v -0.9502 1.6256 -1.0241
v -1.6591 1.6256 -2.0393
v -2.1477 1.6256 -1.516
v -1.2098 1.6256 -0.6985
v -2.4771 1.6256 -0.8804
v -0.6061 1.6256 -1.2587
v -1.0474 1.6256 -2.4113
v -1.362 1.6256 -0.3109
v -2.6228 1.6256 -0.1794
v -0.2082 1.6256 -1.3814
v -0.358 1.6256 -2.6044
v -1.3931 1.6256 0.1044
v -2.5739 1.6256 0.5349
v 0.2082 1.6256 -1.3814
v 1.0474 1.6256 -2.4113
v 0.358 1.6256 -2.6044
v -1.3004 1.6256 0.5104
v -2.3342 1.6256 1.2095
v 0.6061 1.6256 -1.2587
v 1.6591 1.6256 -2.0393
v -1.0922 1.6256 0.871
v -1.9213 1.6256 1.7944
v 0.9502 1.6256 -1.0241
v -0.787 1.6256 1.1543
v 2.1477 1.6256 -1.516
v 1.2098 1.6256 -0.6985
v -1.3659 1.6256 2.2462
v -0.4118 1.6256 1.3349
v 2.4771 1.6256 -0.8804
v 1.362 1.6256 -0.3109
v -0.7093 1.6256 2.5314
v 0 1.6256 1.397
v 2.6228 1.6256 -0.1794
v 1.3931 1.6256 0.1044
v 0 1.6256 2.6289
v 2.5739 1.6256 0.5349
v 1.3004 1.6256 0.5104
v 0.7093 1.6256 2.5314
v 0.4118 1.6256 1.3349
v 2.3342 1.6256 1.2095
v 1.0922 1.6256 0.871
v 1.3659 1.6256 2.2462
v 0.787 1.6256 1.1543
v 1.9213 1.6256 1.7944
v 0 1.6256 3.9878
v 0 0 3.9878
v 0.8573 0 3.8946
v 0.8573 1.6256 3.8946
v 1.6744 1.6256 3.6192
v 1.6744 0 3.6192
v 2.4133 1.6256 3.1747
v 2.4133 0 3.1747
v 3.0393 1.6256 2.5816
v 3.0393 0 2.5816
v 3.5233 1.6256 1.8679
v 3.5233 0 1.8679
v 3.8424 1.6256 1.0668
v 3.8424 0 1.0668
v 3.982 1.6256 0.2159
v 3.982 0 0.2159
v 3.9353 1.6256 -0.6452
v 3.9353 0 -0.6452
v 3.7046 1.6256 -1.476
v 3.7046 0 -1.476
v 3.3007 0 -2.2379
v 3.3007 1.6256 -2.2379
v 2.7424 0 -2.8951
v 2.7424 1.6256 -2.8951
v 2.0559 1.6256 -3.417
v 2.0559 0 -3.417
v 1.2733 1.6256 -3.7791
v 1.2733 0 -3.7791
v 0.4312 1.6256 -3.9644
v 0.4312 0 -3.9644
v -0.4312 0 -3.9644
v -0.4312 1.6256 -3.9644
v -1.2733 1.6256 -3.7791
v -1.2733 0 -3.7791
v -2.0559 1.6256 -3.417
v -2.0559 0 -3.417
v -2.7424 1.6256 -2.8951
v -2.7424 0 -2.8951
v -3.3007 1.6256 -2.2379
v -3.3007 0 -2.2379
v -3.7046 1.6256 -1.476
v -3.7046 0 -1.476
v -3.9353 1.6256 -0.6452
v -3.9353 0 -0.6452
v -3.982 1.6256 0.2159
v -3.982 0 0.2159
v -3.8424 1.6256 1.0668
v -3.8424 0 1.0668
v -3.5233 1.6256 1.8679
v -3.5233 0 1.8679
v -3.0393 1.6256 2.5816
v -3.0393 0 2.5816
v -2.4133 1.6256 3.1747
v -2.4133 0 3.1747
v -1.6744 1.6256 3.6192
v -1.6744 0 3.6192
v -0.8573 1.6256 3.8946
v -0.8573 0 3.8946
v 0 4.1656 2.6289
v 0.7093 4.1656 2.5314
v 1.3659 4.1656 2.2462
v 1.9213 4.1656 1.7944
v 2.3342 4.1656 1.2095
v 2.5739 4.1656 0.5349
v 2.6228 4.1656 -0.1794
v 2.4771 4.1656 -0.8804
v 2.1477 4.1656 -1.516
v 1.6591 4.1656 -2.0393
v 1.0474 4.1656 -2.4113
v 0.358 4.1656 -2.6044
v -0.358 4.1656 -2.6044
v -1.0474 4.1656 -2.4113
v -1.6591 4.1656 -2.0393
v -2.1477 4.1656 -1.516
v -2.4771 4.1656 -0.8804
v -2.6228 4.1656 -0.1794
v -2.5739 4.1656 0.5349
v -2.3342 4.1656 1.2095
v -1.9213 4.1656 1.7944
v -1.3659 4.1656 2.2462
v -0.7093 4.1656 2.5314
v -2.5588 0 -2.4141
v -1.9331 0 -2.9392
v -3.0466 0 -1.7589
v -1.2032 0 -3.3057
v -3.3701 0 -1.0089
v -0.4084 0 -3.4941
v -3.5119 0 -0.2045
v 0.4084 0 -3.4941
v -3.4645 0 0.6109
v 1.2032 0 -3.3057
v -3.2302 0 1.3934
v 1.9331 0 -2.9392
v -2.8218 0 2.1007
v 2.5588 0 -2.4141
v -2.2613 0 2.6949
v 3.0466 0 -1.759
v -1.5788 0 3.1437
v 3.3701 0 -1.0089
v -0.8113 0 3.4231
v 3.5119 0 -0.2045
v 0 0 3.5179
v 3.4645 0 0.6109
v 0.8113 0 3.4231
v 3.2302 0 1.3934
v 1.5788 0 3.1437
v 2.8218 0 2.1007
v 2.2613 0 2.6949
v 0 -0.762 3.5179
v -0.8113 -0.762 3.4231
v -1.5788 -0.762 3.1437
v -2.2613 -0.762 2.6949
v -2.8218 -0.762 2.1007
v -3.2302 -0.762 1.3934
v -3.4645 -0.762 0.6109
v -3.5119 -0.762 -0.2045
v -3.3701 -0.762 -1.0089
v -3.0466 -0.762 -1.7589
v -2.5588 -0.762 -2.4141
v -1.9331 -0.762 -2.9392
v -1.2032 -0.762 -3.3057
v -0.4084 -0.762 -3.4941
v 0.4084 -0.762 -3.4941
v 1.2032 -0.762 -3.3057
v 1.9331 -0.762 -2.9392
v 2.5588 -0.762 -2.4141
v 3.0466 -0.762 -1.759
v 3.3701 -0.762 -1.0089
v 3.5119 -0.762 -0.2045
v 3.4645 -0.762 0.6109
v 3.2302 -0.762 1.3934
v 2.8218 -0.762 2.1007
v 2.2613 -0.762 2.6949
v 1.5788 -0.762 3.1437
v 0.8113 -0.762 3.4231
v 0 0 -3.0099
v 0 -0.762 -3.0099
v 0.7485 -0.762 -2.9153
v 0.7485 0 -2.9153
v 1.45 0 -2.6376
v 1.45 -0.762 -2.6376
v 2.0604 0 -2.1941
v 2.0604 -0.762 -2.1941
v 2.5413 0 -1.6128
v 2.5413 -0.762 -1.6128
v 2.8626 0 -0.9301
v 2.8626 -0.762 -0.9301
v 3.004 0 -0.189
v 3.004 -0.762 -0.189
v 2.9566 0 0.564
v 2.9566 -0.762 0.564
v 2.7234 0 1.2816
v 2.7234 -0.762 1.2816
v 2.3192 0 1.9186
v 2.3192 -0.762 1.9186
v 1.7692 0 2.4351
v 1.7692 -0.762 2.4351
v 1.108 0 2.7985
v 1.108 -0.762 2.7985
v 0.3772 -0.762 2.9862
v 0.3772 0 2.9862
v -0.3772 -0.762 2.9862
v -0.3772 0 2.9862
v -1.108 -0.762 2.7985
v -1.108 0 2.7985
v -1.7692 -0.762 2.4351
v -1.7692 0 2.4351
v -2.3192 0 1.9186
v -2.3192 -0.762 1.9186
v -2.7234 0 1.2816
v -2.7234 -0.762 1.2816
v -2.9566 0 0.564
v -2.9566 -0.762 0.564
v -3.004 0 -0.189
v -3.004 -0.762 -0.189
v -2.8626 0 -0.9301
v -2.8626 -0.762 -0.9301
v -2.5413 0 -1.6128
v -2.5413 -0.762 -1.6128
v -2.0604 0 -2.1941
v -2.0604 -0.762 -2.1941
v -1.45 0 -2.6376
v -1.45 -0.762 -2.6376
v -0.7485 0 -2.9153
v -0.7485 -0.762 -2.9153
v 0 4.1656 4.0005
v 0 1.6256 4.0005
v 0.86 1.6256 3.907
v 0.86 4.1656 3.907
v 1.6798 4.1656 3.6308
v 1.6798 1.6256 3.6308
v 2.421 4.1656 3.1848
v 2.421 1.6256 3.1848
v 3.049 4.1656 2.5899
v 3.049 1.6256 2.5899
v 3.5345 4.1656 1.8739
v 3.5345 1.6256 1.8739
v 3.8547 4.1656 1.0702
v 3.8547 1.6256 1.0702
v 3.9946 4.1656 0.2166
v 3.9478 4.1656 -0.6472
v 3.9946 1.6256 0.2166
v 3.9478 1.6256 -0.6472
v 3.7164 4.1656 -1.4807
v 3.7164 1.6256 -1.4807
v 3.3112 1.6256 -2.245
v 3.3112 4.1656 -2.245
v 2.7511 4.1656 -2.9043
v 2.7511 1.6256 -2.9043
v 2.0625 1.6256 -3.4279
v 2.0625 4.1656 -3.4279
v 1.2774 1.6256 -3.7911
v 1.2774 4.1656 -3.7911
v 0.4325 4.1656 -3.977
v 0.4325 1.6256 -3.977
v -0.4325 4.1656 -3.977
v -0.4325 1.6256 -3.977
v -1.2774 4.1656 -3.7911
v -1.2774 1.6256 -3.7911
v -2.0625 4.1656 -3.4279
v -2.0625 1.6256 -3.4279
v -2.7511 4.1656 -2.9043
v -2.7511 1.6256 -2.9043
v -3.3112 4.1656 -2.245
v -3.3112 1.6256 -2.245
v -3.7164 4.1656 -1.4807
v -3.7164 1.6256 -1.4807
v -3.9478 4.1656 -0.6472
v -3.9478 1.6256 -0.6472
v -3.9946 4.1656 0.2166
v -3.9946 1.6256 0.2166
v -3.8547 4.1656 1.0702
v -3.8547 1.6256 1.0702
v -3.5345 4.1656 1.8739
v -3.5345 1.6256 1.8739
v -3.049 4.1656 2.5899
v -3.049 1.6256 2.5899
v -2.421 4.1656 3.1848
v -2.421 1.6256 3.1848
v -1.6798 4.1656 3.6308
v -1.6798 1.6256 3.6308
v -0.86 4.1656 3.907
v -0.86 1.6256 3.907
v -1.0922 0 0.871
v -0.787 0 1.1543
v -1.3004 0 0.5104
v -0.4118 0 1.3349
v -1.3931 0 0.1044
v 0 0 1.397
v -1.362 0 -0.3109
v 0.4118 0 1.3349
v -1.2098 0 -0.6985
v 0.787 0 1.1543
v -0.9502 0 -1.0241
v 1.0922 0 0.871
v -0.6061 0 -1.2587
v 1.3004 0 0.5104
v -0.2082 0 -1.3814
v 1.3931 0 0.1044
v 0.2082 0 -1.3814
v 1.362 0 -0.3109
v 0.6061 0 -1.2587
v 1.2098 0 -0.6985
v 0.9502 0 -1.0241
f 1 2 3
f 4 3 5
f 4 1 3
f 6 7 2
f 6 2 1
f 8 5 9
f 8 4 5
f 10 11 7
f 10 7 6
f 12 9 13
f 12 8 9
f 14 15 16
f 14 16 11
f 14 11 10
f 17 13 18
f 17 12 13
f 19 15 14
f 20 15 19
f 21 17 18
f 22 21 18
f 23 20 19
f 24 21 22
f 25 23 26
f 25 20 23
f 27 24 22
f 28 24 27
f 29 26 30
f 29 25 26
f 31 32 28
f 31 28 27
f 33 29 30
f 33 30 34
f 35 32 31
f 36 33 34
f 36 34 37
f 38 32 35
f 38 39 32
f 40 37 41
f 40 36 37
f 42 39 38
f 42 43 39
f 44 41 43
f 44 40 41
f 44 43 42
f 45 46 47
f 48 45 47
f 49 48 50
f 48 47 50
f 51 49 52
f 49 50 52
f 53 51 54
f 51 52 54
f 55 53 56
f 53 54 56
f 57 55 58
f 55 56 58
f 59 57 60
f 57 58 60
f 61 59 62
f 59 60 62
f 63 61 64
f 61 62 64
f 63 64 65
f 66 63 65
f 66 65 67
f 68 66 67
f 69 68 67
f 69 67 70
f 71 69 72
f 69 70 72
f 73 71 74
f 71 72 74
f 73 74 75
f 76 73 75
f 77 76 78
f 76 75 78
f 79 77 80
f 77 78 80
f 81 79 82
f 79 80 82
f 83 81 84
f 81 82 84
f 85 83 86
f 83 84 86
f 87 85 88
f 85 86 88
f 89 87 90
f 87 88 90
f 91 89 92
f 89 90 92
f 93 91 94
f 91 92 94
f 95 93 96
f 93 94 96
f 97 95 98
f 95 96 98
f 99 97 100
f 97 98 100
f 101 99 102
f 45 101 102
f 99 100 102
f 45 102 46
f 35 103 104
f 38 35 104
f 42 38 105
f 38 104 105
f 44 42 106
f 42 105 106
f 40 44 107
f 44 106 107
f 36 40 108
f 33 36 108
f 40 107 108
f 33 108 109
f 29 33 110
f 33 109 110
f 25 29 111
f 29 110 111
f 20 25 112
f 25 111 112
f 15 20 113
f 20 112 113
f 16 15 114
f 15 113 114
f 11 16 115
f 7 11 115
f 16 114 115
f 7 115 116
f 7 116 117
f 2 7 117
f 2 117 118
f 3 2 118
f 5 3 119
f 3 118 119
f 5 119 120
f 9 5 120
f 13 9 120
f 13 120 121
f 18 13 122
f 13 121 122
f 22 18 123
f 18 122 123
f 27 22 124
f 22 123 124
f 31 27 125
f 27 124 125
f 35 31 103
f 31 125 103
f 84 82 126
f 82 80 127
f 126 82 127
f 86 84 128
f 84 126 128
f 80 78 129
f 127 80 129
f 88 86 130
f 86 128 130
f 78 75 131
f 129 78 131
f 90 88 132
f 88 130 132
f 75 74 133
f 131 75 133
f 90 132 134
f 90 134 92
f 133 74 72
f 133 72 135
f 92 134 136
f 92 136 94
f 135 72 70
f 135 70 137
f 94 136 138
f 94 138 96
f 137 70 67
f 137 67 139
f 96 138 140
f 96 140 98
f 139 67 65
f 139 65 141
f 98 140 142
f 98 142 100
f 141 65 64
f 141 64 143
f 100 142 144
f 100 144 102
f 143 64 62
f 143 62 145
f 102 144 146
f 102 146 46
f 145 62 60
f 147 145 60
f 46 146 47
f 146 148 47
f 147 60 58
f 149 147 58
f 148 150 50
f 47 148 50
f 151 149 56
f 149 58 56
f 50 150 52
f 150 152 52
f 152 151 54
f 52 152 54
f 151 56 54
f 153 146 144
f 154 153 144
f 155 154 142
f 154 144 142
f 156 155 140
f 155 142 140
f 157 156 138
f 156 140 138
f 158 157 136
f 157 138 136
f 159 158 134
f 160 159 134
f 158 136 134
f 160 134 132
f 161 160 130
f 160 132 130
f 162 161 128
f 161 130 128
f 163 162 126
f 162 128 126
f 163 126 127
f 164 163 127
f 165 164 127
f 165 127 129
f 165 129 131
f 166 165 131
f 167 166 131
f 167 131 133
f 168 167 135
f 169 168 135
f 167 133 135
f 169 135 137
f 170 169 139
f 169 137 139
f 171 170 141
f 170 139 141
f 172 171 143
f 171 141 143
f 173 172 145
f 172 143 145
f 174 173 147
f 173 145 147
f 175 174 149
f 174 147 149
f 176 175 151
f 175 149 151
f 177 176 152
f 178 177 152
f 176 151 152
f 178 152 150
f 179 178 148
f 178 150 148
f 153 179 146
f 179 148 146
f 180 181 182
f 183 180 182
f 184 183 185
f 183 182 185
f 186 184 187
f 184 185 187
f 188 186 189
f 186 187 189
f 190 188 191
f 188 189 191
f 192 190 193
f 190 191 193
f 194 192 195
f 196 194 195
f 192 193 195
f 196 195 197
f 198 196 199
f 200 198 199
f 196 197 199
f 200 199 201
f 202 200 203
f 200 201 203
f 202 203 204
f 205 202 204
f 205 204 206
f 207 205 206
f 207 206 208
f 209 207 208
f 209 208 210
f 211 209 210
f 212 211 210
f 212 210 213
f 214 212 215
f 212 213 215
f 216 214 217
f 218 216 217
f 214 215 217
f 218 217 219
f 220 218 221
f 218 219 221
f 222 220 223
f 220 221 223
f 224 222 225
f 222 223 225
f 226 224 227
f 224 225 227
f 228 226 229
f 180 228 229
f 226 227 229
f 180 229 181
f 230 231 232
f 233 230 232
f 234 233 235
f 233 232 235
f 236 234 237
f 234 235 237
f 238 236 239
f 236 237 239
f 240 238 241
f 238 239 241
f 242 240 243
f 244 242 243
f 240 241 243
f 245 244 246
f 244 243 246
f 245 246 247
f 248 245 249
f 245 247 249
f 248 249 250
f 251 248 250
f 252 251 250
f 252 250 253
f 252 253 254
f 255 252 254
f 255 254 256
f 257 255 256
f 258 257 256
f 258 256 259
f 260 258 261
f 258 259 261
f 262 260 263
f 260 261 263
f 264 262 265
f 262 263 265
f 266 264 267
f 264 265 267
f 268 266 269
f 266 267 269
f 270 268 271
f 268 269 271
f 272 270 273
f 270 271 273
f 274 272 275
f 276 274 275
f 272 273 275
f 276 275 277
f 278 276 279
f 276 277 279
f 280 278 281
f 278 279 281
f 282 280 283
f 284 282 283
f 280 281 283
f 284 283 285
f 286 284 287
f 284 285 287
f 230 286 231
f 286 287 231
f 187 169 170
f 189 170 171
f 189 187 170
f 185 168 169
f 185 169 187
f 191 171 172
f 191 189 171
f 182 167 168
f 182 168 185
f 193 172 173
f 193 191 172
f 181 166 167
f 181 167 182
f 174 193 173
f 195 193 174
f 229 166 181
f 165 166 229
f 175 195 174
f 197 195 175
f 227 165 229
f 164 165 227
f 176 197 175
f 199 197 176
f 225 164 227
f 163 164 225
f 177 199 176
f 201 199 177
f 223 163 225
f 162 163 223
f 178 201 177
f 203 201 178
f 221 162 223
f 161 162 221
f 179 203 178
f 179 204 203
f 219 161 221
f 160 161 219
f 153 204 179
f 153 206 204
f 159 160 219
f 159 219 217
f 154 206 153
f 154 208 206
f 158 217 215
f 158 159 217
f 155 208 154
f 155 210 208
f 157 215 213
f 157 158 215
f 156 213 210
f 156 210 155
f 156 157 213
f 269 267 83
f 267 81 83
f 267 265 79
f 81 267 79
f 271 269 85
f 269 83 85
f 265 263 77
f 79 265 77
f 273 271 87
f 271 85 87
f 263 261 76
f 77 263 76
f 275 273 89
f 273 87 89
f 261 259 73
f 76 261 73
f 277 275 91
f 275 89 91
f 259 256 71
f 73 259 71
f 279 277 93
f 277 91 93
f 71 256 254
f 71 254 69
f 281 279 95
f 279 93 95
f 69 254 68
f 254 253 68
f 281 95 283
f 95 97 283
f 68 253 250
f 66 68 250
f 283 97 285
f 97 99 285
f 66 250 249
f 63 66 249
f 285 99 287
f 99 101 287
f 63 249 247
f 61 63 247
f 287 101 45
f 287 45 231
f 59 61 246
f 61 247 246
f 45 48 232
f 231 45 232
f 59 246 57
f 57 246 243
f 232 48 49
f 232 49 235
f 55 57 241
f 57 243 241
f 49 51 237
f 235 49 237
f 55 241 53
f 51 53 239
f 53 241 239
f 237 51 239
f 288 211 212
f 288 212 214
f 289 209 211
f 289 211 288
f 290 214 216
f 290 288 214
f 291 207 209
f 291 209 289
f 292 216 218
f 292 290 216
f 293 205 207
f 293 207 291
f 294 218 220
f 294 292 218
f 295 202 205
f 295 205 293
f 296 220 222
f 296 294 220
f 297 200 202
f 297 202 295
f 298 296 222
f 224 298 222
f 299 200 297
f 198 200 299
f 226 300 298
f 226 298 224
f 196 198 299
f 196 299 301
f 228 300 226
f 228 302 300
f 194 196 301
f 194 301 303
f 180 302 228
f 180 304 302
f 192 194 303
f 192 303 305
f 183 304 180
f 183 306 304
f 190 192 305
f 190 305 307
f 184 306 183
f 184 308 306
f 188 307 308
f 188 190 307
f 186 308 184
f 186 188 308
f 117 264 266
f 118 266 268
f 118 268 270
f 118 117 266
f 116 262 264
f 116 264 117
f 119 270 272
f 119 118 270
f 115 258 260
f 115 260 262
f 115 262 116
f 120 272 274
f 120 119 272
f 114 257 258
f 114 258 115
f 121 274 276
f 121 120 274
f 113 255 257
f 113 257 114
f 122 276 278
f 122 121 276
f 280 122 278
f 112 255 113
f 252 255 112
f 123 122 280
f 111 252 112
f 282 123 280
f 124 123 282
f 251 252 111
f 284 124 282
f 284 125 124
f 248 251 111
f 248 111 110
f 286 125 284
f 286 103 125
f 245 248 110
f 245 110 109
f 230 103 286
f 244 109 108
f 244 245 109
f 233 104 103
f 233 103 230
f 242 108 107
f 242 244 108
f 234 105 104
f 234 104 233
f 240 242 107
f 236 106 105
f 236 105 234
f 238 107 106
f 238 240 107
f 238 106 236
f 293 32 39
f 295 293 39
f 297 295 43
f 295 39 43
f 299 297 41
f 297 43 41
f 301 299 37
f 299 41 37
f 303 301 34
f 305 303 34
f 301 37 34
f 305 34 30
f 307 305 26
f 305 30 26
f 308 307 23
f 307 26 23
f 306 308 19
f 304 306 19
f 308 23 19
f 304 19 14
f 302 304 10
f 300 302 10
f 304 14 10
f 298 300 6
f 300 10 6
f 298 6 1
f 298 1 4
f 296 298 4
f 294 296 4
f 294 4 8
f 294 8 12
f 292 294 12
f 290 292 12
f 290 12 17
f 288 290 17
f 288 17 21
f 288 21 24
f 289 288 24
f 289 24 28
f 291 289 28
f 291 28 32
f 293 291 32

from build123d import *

# Parameters (mm, degrees)
SKETCH1_R           = 3.9878
BOSS_EXTRUDE1_DEPTH = 1.6256
SKETCH2_R           = 4.0005
BOSS_EXTRUDE2_DEPTH = 2.54
SKETCH3_R           = 3.5179
BOSS_EXTRUDE3_DEPTH = 0.762
SKETCH4_R           = 3.0099
CUT_EXTRUDE1_DEPTH  = 0.762
SKETCH5_R           = 2.6289
CUT_EXTRUDE2_DEPTH  = 2.54
SKETCH6_R           = 1.397
CUT_EXTRUDE3_DEPTH  = 7.201580484


with BuildPart() as part:
    # Sketch1 → Boss-Extrude1 (new body)
    with BuildSketch(Plane(origin=(0, 0, 0), x_dir=(1, 0, 0), z_dir=(0, 1, 0))):
        with Locations(Location((0, 0, 0), (0, 0, 270))):
            Circle(SKETCH1_R)
    extrude(amount=BOSS_EXTRUDE1_DEPTH)

    # Sketch2 → Boss-Extrude2 (add)
    with BuildSketch(Plane(origin=(0, 1.6256, 0), x_dir=(1, 0, 0), z_dir=(0, 1, 0))):
        with Locations(Location((0, 0, 0), (0, 0, 270))):
            Circle(SKETCH2_R)
    extrude(amount=BOSS_EXTRUDE2_DEPTH)

    # Sketch3 → Boss-Extrude3 (add)
    with BuildSketch(Plane.XZ):
        with Locations(Location((0, 0, 0), (0, 0, 90))):
            Circle(SKETCH3_R)
    extrude(amount=BOSS_EXTRUDE3_DEPTH)

    # Sketch4 → Cut-Extrude1 (cut)
    with BuildSketch(Plane.XZ.offset(0.762)):
        with Locations(Location((0, 0, 0), (0, 0, 270))):
            Circle(SKETCH4_R)
    extrude(amount=-CUT_EXTRUDE1_DEPTH, mode=Mode.SUBTRACT)

    # Sketch5 → Cut-Extrude2 (cut)
    with BuildSketch(Plane(origin=(0, 4.1656, 0), x_dir=(1, 0, 0), z_dir=(0, 1, 0))):
        with Locations(Location((0, 0, 0), (0, 0, 270))):
            Circle(SKETCH5_R)
    extrude(amount=-CUT_EXTRUDE2_DEPTH, mode=Mode.SUBTRACT)

    # Sketch6 → Cut-Extrude3 (cut, through all)
    with BuildSketch(Plane(origin=(0, 1.6256, 0), x_dir=(1, 0, 0), z_dir=(0, 1, 0))):
        with Locations(Location((0, 0, 0), (0, 0, 270))):
            Circle(SKETCH6_R)
    extrude(amount=-CUT_EXTRUDE3_DEPTH, mode=Mode.SUBTRACT)


solid = part.part
